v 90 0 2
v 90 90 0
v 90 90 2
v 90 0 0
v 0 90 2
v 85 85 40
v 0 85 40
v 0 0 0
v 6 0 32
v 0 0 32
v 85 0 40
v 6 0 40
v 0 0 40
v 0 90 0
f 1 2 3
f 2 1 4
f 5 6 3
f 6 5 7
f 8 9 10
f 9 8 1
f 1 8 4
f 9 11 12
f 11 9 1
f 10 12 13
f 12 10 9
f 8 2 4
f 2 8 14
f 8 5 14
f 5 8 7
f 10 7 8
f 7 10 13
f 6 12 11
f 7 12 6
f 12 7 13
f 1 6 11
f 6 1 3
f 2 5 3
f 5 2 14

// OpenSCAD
// Magnetic stirrer housing - upside-down open box over a 80 mm PC fan
// Print orientation: top plate on bed (z = 0..2), walls rise to z = 40

$fn = 64;

// ---- Dimensions (mm) ----
top_t      = 2;     // top plate thickness
wall_t     = 2.5;   // wall thickness
box_h      = 40;    // outer height (z of open top)
outer_w    = 90;    // outer size in X and Y
hole_d     = 4.5;   // M4 screw hole diameter
hole_p     = 71.5;  // square pitch of screw holes
notch_w    = 12;    // cable notch width
notch_bot  = 8;     // notch depth from open edge (z = 32..40)
eps        = 0.5;   // cutter overshoot past faces

// ---- Model ----
difference() {
    // Outer box
    hull() {
        cube([outer_w, outer_w, top_t]);                          // bottom plate (z=0..2)
        cube([outer_w - 2*wall_t, outer_w - 2*wall_t, box_h]);   // inner block (z=2..40)
    }

    // Four screw holes through the top plate, centred on the plate
    for (i = [0 : 3])
        translate([-hole_p/2, -hole_p/2, top_t])
            cylinder(d = hole_d, h = top_t + eps, $fn = 64);

    // Cable notch in one wall, centred along the wall, open edge at z = box_h
    translate([-notch_w/2, -outer_w/2 + wall_t, box_h - notch_bot])
        cube([notch_w, outer_w/2 - wall_t, notch_bot + eps]);
}
